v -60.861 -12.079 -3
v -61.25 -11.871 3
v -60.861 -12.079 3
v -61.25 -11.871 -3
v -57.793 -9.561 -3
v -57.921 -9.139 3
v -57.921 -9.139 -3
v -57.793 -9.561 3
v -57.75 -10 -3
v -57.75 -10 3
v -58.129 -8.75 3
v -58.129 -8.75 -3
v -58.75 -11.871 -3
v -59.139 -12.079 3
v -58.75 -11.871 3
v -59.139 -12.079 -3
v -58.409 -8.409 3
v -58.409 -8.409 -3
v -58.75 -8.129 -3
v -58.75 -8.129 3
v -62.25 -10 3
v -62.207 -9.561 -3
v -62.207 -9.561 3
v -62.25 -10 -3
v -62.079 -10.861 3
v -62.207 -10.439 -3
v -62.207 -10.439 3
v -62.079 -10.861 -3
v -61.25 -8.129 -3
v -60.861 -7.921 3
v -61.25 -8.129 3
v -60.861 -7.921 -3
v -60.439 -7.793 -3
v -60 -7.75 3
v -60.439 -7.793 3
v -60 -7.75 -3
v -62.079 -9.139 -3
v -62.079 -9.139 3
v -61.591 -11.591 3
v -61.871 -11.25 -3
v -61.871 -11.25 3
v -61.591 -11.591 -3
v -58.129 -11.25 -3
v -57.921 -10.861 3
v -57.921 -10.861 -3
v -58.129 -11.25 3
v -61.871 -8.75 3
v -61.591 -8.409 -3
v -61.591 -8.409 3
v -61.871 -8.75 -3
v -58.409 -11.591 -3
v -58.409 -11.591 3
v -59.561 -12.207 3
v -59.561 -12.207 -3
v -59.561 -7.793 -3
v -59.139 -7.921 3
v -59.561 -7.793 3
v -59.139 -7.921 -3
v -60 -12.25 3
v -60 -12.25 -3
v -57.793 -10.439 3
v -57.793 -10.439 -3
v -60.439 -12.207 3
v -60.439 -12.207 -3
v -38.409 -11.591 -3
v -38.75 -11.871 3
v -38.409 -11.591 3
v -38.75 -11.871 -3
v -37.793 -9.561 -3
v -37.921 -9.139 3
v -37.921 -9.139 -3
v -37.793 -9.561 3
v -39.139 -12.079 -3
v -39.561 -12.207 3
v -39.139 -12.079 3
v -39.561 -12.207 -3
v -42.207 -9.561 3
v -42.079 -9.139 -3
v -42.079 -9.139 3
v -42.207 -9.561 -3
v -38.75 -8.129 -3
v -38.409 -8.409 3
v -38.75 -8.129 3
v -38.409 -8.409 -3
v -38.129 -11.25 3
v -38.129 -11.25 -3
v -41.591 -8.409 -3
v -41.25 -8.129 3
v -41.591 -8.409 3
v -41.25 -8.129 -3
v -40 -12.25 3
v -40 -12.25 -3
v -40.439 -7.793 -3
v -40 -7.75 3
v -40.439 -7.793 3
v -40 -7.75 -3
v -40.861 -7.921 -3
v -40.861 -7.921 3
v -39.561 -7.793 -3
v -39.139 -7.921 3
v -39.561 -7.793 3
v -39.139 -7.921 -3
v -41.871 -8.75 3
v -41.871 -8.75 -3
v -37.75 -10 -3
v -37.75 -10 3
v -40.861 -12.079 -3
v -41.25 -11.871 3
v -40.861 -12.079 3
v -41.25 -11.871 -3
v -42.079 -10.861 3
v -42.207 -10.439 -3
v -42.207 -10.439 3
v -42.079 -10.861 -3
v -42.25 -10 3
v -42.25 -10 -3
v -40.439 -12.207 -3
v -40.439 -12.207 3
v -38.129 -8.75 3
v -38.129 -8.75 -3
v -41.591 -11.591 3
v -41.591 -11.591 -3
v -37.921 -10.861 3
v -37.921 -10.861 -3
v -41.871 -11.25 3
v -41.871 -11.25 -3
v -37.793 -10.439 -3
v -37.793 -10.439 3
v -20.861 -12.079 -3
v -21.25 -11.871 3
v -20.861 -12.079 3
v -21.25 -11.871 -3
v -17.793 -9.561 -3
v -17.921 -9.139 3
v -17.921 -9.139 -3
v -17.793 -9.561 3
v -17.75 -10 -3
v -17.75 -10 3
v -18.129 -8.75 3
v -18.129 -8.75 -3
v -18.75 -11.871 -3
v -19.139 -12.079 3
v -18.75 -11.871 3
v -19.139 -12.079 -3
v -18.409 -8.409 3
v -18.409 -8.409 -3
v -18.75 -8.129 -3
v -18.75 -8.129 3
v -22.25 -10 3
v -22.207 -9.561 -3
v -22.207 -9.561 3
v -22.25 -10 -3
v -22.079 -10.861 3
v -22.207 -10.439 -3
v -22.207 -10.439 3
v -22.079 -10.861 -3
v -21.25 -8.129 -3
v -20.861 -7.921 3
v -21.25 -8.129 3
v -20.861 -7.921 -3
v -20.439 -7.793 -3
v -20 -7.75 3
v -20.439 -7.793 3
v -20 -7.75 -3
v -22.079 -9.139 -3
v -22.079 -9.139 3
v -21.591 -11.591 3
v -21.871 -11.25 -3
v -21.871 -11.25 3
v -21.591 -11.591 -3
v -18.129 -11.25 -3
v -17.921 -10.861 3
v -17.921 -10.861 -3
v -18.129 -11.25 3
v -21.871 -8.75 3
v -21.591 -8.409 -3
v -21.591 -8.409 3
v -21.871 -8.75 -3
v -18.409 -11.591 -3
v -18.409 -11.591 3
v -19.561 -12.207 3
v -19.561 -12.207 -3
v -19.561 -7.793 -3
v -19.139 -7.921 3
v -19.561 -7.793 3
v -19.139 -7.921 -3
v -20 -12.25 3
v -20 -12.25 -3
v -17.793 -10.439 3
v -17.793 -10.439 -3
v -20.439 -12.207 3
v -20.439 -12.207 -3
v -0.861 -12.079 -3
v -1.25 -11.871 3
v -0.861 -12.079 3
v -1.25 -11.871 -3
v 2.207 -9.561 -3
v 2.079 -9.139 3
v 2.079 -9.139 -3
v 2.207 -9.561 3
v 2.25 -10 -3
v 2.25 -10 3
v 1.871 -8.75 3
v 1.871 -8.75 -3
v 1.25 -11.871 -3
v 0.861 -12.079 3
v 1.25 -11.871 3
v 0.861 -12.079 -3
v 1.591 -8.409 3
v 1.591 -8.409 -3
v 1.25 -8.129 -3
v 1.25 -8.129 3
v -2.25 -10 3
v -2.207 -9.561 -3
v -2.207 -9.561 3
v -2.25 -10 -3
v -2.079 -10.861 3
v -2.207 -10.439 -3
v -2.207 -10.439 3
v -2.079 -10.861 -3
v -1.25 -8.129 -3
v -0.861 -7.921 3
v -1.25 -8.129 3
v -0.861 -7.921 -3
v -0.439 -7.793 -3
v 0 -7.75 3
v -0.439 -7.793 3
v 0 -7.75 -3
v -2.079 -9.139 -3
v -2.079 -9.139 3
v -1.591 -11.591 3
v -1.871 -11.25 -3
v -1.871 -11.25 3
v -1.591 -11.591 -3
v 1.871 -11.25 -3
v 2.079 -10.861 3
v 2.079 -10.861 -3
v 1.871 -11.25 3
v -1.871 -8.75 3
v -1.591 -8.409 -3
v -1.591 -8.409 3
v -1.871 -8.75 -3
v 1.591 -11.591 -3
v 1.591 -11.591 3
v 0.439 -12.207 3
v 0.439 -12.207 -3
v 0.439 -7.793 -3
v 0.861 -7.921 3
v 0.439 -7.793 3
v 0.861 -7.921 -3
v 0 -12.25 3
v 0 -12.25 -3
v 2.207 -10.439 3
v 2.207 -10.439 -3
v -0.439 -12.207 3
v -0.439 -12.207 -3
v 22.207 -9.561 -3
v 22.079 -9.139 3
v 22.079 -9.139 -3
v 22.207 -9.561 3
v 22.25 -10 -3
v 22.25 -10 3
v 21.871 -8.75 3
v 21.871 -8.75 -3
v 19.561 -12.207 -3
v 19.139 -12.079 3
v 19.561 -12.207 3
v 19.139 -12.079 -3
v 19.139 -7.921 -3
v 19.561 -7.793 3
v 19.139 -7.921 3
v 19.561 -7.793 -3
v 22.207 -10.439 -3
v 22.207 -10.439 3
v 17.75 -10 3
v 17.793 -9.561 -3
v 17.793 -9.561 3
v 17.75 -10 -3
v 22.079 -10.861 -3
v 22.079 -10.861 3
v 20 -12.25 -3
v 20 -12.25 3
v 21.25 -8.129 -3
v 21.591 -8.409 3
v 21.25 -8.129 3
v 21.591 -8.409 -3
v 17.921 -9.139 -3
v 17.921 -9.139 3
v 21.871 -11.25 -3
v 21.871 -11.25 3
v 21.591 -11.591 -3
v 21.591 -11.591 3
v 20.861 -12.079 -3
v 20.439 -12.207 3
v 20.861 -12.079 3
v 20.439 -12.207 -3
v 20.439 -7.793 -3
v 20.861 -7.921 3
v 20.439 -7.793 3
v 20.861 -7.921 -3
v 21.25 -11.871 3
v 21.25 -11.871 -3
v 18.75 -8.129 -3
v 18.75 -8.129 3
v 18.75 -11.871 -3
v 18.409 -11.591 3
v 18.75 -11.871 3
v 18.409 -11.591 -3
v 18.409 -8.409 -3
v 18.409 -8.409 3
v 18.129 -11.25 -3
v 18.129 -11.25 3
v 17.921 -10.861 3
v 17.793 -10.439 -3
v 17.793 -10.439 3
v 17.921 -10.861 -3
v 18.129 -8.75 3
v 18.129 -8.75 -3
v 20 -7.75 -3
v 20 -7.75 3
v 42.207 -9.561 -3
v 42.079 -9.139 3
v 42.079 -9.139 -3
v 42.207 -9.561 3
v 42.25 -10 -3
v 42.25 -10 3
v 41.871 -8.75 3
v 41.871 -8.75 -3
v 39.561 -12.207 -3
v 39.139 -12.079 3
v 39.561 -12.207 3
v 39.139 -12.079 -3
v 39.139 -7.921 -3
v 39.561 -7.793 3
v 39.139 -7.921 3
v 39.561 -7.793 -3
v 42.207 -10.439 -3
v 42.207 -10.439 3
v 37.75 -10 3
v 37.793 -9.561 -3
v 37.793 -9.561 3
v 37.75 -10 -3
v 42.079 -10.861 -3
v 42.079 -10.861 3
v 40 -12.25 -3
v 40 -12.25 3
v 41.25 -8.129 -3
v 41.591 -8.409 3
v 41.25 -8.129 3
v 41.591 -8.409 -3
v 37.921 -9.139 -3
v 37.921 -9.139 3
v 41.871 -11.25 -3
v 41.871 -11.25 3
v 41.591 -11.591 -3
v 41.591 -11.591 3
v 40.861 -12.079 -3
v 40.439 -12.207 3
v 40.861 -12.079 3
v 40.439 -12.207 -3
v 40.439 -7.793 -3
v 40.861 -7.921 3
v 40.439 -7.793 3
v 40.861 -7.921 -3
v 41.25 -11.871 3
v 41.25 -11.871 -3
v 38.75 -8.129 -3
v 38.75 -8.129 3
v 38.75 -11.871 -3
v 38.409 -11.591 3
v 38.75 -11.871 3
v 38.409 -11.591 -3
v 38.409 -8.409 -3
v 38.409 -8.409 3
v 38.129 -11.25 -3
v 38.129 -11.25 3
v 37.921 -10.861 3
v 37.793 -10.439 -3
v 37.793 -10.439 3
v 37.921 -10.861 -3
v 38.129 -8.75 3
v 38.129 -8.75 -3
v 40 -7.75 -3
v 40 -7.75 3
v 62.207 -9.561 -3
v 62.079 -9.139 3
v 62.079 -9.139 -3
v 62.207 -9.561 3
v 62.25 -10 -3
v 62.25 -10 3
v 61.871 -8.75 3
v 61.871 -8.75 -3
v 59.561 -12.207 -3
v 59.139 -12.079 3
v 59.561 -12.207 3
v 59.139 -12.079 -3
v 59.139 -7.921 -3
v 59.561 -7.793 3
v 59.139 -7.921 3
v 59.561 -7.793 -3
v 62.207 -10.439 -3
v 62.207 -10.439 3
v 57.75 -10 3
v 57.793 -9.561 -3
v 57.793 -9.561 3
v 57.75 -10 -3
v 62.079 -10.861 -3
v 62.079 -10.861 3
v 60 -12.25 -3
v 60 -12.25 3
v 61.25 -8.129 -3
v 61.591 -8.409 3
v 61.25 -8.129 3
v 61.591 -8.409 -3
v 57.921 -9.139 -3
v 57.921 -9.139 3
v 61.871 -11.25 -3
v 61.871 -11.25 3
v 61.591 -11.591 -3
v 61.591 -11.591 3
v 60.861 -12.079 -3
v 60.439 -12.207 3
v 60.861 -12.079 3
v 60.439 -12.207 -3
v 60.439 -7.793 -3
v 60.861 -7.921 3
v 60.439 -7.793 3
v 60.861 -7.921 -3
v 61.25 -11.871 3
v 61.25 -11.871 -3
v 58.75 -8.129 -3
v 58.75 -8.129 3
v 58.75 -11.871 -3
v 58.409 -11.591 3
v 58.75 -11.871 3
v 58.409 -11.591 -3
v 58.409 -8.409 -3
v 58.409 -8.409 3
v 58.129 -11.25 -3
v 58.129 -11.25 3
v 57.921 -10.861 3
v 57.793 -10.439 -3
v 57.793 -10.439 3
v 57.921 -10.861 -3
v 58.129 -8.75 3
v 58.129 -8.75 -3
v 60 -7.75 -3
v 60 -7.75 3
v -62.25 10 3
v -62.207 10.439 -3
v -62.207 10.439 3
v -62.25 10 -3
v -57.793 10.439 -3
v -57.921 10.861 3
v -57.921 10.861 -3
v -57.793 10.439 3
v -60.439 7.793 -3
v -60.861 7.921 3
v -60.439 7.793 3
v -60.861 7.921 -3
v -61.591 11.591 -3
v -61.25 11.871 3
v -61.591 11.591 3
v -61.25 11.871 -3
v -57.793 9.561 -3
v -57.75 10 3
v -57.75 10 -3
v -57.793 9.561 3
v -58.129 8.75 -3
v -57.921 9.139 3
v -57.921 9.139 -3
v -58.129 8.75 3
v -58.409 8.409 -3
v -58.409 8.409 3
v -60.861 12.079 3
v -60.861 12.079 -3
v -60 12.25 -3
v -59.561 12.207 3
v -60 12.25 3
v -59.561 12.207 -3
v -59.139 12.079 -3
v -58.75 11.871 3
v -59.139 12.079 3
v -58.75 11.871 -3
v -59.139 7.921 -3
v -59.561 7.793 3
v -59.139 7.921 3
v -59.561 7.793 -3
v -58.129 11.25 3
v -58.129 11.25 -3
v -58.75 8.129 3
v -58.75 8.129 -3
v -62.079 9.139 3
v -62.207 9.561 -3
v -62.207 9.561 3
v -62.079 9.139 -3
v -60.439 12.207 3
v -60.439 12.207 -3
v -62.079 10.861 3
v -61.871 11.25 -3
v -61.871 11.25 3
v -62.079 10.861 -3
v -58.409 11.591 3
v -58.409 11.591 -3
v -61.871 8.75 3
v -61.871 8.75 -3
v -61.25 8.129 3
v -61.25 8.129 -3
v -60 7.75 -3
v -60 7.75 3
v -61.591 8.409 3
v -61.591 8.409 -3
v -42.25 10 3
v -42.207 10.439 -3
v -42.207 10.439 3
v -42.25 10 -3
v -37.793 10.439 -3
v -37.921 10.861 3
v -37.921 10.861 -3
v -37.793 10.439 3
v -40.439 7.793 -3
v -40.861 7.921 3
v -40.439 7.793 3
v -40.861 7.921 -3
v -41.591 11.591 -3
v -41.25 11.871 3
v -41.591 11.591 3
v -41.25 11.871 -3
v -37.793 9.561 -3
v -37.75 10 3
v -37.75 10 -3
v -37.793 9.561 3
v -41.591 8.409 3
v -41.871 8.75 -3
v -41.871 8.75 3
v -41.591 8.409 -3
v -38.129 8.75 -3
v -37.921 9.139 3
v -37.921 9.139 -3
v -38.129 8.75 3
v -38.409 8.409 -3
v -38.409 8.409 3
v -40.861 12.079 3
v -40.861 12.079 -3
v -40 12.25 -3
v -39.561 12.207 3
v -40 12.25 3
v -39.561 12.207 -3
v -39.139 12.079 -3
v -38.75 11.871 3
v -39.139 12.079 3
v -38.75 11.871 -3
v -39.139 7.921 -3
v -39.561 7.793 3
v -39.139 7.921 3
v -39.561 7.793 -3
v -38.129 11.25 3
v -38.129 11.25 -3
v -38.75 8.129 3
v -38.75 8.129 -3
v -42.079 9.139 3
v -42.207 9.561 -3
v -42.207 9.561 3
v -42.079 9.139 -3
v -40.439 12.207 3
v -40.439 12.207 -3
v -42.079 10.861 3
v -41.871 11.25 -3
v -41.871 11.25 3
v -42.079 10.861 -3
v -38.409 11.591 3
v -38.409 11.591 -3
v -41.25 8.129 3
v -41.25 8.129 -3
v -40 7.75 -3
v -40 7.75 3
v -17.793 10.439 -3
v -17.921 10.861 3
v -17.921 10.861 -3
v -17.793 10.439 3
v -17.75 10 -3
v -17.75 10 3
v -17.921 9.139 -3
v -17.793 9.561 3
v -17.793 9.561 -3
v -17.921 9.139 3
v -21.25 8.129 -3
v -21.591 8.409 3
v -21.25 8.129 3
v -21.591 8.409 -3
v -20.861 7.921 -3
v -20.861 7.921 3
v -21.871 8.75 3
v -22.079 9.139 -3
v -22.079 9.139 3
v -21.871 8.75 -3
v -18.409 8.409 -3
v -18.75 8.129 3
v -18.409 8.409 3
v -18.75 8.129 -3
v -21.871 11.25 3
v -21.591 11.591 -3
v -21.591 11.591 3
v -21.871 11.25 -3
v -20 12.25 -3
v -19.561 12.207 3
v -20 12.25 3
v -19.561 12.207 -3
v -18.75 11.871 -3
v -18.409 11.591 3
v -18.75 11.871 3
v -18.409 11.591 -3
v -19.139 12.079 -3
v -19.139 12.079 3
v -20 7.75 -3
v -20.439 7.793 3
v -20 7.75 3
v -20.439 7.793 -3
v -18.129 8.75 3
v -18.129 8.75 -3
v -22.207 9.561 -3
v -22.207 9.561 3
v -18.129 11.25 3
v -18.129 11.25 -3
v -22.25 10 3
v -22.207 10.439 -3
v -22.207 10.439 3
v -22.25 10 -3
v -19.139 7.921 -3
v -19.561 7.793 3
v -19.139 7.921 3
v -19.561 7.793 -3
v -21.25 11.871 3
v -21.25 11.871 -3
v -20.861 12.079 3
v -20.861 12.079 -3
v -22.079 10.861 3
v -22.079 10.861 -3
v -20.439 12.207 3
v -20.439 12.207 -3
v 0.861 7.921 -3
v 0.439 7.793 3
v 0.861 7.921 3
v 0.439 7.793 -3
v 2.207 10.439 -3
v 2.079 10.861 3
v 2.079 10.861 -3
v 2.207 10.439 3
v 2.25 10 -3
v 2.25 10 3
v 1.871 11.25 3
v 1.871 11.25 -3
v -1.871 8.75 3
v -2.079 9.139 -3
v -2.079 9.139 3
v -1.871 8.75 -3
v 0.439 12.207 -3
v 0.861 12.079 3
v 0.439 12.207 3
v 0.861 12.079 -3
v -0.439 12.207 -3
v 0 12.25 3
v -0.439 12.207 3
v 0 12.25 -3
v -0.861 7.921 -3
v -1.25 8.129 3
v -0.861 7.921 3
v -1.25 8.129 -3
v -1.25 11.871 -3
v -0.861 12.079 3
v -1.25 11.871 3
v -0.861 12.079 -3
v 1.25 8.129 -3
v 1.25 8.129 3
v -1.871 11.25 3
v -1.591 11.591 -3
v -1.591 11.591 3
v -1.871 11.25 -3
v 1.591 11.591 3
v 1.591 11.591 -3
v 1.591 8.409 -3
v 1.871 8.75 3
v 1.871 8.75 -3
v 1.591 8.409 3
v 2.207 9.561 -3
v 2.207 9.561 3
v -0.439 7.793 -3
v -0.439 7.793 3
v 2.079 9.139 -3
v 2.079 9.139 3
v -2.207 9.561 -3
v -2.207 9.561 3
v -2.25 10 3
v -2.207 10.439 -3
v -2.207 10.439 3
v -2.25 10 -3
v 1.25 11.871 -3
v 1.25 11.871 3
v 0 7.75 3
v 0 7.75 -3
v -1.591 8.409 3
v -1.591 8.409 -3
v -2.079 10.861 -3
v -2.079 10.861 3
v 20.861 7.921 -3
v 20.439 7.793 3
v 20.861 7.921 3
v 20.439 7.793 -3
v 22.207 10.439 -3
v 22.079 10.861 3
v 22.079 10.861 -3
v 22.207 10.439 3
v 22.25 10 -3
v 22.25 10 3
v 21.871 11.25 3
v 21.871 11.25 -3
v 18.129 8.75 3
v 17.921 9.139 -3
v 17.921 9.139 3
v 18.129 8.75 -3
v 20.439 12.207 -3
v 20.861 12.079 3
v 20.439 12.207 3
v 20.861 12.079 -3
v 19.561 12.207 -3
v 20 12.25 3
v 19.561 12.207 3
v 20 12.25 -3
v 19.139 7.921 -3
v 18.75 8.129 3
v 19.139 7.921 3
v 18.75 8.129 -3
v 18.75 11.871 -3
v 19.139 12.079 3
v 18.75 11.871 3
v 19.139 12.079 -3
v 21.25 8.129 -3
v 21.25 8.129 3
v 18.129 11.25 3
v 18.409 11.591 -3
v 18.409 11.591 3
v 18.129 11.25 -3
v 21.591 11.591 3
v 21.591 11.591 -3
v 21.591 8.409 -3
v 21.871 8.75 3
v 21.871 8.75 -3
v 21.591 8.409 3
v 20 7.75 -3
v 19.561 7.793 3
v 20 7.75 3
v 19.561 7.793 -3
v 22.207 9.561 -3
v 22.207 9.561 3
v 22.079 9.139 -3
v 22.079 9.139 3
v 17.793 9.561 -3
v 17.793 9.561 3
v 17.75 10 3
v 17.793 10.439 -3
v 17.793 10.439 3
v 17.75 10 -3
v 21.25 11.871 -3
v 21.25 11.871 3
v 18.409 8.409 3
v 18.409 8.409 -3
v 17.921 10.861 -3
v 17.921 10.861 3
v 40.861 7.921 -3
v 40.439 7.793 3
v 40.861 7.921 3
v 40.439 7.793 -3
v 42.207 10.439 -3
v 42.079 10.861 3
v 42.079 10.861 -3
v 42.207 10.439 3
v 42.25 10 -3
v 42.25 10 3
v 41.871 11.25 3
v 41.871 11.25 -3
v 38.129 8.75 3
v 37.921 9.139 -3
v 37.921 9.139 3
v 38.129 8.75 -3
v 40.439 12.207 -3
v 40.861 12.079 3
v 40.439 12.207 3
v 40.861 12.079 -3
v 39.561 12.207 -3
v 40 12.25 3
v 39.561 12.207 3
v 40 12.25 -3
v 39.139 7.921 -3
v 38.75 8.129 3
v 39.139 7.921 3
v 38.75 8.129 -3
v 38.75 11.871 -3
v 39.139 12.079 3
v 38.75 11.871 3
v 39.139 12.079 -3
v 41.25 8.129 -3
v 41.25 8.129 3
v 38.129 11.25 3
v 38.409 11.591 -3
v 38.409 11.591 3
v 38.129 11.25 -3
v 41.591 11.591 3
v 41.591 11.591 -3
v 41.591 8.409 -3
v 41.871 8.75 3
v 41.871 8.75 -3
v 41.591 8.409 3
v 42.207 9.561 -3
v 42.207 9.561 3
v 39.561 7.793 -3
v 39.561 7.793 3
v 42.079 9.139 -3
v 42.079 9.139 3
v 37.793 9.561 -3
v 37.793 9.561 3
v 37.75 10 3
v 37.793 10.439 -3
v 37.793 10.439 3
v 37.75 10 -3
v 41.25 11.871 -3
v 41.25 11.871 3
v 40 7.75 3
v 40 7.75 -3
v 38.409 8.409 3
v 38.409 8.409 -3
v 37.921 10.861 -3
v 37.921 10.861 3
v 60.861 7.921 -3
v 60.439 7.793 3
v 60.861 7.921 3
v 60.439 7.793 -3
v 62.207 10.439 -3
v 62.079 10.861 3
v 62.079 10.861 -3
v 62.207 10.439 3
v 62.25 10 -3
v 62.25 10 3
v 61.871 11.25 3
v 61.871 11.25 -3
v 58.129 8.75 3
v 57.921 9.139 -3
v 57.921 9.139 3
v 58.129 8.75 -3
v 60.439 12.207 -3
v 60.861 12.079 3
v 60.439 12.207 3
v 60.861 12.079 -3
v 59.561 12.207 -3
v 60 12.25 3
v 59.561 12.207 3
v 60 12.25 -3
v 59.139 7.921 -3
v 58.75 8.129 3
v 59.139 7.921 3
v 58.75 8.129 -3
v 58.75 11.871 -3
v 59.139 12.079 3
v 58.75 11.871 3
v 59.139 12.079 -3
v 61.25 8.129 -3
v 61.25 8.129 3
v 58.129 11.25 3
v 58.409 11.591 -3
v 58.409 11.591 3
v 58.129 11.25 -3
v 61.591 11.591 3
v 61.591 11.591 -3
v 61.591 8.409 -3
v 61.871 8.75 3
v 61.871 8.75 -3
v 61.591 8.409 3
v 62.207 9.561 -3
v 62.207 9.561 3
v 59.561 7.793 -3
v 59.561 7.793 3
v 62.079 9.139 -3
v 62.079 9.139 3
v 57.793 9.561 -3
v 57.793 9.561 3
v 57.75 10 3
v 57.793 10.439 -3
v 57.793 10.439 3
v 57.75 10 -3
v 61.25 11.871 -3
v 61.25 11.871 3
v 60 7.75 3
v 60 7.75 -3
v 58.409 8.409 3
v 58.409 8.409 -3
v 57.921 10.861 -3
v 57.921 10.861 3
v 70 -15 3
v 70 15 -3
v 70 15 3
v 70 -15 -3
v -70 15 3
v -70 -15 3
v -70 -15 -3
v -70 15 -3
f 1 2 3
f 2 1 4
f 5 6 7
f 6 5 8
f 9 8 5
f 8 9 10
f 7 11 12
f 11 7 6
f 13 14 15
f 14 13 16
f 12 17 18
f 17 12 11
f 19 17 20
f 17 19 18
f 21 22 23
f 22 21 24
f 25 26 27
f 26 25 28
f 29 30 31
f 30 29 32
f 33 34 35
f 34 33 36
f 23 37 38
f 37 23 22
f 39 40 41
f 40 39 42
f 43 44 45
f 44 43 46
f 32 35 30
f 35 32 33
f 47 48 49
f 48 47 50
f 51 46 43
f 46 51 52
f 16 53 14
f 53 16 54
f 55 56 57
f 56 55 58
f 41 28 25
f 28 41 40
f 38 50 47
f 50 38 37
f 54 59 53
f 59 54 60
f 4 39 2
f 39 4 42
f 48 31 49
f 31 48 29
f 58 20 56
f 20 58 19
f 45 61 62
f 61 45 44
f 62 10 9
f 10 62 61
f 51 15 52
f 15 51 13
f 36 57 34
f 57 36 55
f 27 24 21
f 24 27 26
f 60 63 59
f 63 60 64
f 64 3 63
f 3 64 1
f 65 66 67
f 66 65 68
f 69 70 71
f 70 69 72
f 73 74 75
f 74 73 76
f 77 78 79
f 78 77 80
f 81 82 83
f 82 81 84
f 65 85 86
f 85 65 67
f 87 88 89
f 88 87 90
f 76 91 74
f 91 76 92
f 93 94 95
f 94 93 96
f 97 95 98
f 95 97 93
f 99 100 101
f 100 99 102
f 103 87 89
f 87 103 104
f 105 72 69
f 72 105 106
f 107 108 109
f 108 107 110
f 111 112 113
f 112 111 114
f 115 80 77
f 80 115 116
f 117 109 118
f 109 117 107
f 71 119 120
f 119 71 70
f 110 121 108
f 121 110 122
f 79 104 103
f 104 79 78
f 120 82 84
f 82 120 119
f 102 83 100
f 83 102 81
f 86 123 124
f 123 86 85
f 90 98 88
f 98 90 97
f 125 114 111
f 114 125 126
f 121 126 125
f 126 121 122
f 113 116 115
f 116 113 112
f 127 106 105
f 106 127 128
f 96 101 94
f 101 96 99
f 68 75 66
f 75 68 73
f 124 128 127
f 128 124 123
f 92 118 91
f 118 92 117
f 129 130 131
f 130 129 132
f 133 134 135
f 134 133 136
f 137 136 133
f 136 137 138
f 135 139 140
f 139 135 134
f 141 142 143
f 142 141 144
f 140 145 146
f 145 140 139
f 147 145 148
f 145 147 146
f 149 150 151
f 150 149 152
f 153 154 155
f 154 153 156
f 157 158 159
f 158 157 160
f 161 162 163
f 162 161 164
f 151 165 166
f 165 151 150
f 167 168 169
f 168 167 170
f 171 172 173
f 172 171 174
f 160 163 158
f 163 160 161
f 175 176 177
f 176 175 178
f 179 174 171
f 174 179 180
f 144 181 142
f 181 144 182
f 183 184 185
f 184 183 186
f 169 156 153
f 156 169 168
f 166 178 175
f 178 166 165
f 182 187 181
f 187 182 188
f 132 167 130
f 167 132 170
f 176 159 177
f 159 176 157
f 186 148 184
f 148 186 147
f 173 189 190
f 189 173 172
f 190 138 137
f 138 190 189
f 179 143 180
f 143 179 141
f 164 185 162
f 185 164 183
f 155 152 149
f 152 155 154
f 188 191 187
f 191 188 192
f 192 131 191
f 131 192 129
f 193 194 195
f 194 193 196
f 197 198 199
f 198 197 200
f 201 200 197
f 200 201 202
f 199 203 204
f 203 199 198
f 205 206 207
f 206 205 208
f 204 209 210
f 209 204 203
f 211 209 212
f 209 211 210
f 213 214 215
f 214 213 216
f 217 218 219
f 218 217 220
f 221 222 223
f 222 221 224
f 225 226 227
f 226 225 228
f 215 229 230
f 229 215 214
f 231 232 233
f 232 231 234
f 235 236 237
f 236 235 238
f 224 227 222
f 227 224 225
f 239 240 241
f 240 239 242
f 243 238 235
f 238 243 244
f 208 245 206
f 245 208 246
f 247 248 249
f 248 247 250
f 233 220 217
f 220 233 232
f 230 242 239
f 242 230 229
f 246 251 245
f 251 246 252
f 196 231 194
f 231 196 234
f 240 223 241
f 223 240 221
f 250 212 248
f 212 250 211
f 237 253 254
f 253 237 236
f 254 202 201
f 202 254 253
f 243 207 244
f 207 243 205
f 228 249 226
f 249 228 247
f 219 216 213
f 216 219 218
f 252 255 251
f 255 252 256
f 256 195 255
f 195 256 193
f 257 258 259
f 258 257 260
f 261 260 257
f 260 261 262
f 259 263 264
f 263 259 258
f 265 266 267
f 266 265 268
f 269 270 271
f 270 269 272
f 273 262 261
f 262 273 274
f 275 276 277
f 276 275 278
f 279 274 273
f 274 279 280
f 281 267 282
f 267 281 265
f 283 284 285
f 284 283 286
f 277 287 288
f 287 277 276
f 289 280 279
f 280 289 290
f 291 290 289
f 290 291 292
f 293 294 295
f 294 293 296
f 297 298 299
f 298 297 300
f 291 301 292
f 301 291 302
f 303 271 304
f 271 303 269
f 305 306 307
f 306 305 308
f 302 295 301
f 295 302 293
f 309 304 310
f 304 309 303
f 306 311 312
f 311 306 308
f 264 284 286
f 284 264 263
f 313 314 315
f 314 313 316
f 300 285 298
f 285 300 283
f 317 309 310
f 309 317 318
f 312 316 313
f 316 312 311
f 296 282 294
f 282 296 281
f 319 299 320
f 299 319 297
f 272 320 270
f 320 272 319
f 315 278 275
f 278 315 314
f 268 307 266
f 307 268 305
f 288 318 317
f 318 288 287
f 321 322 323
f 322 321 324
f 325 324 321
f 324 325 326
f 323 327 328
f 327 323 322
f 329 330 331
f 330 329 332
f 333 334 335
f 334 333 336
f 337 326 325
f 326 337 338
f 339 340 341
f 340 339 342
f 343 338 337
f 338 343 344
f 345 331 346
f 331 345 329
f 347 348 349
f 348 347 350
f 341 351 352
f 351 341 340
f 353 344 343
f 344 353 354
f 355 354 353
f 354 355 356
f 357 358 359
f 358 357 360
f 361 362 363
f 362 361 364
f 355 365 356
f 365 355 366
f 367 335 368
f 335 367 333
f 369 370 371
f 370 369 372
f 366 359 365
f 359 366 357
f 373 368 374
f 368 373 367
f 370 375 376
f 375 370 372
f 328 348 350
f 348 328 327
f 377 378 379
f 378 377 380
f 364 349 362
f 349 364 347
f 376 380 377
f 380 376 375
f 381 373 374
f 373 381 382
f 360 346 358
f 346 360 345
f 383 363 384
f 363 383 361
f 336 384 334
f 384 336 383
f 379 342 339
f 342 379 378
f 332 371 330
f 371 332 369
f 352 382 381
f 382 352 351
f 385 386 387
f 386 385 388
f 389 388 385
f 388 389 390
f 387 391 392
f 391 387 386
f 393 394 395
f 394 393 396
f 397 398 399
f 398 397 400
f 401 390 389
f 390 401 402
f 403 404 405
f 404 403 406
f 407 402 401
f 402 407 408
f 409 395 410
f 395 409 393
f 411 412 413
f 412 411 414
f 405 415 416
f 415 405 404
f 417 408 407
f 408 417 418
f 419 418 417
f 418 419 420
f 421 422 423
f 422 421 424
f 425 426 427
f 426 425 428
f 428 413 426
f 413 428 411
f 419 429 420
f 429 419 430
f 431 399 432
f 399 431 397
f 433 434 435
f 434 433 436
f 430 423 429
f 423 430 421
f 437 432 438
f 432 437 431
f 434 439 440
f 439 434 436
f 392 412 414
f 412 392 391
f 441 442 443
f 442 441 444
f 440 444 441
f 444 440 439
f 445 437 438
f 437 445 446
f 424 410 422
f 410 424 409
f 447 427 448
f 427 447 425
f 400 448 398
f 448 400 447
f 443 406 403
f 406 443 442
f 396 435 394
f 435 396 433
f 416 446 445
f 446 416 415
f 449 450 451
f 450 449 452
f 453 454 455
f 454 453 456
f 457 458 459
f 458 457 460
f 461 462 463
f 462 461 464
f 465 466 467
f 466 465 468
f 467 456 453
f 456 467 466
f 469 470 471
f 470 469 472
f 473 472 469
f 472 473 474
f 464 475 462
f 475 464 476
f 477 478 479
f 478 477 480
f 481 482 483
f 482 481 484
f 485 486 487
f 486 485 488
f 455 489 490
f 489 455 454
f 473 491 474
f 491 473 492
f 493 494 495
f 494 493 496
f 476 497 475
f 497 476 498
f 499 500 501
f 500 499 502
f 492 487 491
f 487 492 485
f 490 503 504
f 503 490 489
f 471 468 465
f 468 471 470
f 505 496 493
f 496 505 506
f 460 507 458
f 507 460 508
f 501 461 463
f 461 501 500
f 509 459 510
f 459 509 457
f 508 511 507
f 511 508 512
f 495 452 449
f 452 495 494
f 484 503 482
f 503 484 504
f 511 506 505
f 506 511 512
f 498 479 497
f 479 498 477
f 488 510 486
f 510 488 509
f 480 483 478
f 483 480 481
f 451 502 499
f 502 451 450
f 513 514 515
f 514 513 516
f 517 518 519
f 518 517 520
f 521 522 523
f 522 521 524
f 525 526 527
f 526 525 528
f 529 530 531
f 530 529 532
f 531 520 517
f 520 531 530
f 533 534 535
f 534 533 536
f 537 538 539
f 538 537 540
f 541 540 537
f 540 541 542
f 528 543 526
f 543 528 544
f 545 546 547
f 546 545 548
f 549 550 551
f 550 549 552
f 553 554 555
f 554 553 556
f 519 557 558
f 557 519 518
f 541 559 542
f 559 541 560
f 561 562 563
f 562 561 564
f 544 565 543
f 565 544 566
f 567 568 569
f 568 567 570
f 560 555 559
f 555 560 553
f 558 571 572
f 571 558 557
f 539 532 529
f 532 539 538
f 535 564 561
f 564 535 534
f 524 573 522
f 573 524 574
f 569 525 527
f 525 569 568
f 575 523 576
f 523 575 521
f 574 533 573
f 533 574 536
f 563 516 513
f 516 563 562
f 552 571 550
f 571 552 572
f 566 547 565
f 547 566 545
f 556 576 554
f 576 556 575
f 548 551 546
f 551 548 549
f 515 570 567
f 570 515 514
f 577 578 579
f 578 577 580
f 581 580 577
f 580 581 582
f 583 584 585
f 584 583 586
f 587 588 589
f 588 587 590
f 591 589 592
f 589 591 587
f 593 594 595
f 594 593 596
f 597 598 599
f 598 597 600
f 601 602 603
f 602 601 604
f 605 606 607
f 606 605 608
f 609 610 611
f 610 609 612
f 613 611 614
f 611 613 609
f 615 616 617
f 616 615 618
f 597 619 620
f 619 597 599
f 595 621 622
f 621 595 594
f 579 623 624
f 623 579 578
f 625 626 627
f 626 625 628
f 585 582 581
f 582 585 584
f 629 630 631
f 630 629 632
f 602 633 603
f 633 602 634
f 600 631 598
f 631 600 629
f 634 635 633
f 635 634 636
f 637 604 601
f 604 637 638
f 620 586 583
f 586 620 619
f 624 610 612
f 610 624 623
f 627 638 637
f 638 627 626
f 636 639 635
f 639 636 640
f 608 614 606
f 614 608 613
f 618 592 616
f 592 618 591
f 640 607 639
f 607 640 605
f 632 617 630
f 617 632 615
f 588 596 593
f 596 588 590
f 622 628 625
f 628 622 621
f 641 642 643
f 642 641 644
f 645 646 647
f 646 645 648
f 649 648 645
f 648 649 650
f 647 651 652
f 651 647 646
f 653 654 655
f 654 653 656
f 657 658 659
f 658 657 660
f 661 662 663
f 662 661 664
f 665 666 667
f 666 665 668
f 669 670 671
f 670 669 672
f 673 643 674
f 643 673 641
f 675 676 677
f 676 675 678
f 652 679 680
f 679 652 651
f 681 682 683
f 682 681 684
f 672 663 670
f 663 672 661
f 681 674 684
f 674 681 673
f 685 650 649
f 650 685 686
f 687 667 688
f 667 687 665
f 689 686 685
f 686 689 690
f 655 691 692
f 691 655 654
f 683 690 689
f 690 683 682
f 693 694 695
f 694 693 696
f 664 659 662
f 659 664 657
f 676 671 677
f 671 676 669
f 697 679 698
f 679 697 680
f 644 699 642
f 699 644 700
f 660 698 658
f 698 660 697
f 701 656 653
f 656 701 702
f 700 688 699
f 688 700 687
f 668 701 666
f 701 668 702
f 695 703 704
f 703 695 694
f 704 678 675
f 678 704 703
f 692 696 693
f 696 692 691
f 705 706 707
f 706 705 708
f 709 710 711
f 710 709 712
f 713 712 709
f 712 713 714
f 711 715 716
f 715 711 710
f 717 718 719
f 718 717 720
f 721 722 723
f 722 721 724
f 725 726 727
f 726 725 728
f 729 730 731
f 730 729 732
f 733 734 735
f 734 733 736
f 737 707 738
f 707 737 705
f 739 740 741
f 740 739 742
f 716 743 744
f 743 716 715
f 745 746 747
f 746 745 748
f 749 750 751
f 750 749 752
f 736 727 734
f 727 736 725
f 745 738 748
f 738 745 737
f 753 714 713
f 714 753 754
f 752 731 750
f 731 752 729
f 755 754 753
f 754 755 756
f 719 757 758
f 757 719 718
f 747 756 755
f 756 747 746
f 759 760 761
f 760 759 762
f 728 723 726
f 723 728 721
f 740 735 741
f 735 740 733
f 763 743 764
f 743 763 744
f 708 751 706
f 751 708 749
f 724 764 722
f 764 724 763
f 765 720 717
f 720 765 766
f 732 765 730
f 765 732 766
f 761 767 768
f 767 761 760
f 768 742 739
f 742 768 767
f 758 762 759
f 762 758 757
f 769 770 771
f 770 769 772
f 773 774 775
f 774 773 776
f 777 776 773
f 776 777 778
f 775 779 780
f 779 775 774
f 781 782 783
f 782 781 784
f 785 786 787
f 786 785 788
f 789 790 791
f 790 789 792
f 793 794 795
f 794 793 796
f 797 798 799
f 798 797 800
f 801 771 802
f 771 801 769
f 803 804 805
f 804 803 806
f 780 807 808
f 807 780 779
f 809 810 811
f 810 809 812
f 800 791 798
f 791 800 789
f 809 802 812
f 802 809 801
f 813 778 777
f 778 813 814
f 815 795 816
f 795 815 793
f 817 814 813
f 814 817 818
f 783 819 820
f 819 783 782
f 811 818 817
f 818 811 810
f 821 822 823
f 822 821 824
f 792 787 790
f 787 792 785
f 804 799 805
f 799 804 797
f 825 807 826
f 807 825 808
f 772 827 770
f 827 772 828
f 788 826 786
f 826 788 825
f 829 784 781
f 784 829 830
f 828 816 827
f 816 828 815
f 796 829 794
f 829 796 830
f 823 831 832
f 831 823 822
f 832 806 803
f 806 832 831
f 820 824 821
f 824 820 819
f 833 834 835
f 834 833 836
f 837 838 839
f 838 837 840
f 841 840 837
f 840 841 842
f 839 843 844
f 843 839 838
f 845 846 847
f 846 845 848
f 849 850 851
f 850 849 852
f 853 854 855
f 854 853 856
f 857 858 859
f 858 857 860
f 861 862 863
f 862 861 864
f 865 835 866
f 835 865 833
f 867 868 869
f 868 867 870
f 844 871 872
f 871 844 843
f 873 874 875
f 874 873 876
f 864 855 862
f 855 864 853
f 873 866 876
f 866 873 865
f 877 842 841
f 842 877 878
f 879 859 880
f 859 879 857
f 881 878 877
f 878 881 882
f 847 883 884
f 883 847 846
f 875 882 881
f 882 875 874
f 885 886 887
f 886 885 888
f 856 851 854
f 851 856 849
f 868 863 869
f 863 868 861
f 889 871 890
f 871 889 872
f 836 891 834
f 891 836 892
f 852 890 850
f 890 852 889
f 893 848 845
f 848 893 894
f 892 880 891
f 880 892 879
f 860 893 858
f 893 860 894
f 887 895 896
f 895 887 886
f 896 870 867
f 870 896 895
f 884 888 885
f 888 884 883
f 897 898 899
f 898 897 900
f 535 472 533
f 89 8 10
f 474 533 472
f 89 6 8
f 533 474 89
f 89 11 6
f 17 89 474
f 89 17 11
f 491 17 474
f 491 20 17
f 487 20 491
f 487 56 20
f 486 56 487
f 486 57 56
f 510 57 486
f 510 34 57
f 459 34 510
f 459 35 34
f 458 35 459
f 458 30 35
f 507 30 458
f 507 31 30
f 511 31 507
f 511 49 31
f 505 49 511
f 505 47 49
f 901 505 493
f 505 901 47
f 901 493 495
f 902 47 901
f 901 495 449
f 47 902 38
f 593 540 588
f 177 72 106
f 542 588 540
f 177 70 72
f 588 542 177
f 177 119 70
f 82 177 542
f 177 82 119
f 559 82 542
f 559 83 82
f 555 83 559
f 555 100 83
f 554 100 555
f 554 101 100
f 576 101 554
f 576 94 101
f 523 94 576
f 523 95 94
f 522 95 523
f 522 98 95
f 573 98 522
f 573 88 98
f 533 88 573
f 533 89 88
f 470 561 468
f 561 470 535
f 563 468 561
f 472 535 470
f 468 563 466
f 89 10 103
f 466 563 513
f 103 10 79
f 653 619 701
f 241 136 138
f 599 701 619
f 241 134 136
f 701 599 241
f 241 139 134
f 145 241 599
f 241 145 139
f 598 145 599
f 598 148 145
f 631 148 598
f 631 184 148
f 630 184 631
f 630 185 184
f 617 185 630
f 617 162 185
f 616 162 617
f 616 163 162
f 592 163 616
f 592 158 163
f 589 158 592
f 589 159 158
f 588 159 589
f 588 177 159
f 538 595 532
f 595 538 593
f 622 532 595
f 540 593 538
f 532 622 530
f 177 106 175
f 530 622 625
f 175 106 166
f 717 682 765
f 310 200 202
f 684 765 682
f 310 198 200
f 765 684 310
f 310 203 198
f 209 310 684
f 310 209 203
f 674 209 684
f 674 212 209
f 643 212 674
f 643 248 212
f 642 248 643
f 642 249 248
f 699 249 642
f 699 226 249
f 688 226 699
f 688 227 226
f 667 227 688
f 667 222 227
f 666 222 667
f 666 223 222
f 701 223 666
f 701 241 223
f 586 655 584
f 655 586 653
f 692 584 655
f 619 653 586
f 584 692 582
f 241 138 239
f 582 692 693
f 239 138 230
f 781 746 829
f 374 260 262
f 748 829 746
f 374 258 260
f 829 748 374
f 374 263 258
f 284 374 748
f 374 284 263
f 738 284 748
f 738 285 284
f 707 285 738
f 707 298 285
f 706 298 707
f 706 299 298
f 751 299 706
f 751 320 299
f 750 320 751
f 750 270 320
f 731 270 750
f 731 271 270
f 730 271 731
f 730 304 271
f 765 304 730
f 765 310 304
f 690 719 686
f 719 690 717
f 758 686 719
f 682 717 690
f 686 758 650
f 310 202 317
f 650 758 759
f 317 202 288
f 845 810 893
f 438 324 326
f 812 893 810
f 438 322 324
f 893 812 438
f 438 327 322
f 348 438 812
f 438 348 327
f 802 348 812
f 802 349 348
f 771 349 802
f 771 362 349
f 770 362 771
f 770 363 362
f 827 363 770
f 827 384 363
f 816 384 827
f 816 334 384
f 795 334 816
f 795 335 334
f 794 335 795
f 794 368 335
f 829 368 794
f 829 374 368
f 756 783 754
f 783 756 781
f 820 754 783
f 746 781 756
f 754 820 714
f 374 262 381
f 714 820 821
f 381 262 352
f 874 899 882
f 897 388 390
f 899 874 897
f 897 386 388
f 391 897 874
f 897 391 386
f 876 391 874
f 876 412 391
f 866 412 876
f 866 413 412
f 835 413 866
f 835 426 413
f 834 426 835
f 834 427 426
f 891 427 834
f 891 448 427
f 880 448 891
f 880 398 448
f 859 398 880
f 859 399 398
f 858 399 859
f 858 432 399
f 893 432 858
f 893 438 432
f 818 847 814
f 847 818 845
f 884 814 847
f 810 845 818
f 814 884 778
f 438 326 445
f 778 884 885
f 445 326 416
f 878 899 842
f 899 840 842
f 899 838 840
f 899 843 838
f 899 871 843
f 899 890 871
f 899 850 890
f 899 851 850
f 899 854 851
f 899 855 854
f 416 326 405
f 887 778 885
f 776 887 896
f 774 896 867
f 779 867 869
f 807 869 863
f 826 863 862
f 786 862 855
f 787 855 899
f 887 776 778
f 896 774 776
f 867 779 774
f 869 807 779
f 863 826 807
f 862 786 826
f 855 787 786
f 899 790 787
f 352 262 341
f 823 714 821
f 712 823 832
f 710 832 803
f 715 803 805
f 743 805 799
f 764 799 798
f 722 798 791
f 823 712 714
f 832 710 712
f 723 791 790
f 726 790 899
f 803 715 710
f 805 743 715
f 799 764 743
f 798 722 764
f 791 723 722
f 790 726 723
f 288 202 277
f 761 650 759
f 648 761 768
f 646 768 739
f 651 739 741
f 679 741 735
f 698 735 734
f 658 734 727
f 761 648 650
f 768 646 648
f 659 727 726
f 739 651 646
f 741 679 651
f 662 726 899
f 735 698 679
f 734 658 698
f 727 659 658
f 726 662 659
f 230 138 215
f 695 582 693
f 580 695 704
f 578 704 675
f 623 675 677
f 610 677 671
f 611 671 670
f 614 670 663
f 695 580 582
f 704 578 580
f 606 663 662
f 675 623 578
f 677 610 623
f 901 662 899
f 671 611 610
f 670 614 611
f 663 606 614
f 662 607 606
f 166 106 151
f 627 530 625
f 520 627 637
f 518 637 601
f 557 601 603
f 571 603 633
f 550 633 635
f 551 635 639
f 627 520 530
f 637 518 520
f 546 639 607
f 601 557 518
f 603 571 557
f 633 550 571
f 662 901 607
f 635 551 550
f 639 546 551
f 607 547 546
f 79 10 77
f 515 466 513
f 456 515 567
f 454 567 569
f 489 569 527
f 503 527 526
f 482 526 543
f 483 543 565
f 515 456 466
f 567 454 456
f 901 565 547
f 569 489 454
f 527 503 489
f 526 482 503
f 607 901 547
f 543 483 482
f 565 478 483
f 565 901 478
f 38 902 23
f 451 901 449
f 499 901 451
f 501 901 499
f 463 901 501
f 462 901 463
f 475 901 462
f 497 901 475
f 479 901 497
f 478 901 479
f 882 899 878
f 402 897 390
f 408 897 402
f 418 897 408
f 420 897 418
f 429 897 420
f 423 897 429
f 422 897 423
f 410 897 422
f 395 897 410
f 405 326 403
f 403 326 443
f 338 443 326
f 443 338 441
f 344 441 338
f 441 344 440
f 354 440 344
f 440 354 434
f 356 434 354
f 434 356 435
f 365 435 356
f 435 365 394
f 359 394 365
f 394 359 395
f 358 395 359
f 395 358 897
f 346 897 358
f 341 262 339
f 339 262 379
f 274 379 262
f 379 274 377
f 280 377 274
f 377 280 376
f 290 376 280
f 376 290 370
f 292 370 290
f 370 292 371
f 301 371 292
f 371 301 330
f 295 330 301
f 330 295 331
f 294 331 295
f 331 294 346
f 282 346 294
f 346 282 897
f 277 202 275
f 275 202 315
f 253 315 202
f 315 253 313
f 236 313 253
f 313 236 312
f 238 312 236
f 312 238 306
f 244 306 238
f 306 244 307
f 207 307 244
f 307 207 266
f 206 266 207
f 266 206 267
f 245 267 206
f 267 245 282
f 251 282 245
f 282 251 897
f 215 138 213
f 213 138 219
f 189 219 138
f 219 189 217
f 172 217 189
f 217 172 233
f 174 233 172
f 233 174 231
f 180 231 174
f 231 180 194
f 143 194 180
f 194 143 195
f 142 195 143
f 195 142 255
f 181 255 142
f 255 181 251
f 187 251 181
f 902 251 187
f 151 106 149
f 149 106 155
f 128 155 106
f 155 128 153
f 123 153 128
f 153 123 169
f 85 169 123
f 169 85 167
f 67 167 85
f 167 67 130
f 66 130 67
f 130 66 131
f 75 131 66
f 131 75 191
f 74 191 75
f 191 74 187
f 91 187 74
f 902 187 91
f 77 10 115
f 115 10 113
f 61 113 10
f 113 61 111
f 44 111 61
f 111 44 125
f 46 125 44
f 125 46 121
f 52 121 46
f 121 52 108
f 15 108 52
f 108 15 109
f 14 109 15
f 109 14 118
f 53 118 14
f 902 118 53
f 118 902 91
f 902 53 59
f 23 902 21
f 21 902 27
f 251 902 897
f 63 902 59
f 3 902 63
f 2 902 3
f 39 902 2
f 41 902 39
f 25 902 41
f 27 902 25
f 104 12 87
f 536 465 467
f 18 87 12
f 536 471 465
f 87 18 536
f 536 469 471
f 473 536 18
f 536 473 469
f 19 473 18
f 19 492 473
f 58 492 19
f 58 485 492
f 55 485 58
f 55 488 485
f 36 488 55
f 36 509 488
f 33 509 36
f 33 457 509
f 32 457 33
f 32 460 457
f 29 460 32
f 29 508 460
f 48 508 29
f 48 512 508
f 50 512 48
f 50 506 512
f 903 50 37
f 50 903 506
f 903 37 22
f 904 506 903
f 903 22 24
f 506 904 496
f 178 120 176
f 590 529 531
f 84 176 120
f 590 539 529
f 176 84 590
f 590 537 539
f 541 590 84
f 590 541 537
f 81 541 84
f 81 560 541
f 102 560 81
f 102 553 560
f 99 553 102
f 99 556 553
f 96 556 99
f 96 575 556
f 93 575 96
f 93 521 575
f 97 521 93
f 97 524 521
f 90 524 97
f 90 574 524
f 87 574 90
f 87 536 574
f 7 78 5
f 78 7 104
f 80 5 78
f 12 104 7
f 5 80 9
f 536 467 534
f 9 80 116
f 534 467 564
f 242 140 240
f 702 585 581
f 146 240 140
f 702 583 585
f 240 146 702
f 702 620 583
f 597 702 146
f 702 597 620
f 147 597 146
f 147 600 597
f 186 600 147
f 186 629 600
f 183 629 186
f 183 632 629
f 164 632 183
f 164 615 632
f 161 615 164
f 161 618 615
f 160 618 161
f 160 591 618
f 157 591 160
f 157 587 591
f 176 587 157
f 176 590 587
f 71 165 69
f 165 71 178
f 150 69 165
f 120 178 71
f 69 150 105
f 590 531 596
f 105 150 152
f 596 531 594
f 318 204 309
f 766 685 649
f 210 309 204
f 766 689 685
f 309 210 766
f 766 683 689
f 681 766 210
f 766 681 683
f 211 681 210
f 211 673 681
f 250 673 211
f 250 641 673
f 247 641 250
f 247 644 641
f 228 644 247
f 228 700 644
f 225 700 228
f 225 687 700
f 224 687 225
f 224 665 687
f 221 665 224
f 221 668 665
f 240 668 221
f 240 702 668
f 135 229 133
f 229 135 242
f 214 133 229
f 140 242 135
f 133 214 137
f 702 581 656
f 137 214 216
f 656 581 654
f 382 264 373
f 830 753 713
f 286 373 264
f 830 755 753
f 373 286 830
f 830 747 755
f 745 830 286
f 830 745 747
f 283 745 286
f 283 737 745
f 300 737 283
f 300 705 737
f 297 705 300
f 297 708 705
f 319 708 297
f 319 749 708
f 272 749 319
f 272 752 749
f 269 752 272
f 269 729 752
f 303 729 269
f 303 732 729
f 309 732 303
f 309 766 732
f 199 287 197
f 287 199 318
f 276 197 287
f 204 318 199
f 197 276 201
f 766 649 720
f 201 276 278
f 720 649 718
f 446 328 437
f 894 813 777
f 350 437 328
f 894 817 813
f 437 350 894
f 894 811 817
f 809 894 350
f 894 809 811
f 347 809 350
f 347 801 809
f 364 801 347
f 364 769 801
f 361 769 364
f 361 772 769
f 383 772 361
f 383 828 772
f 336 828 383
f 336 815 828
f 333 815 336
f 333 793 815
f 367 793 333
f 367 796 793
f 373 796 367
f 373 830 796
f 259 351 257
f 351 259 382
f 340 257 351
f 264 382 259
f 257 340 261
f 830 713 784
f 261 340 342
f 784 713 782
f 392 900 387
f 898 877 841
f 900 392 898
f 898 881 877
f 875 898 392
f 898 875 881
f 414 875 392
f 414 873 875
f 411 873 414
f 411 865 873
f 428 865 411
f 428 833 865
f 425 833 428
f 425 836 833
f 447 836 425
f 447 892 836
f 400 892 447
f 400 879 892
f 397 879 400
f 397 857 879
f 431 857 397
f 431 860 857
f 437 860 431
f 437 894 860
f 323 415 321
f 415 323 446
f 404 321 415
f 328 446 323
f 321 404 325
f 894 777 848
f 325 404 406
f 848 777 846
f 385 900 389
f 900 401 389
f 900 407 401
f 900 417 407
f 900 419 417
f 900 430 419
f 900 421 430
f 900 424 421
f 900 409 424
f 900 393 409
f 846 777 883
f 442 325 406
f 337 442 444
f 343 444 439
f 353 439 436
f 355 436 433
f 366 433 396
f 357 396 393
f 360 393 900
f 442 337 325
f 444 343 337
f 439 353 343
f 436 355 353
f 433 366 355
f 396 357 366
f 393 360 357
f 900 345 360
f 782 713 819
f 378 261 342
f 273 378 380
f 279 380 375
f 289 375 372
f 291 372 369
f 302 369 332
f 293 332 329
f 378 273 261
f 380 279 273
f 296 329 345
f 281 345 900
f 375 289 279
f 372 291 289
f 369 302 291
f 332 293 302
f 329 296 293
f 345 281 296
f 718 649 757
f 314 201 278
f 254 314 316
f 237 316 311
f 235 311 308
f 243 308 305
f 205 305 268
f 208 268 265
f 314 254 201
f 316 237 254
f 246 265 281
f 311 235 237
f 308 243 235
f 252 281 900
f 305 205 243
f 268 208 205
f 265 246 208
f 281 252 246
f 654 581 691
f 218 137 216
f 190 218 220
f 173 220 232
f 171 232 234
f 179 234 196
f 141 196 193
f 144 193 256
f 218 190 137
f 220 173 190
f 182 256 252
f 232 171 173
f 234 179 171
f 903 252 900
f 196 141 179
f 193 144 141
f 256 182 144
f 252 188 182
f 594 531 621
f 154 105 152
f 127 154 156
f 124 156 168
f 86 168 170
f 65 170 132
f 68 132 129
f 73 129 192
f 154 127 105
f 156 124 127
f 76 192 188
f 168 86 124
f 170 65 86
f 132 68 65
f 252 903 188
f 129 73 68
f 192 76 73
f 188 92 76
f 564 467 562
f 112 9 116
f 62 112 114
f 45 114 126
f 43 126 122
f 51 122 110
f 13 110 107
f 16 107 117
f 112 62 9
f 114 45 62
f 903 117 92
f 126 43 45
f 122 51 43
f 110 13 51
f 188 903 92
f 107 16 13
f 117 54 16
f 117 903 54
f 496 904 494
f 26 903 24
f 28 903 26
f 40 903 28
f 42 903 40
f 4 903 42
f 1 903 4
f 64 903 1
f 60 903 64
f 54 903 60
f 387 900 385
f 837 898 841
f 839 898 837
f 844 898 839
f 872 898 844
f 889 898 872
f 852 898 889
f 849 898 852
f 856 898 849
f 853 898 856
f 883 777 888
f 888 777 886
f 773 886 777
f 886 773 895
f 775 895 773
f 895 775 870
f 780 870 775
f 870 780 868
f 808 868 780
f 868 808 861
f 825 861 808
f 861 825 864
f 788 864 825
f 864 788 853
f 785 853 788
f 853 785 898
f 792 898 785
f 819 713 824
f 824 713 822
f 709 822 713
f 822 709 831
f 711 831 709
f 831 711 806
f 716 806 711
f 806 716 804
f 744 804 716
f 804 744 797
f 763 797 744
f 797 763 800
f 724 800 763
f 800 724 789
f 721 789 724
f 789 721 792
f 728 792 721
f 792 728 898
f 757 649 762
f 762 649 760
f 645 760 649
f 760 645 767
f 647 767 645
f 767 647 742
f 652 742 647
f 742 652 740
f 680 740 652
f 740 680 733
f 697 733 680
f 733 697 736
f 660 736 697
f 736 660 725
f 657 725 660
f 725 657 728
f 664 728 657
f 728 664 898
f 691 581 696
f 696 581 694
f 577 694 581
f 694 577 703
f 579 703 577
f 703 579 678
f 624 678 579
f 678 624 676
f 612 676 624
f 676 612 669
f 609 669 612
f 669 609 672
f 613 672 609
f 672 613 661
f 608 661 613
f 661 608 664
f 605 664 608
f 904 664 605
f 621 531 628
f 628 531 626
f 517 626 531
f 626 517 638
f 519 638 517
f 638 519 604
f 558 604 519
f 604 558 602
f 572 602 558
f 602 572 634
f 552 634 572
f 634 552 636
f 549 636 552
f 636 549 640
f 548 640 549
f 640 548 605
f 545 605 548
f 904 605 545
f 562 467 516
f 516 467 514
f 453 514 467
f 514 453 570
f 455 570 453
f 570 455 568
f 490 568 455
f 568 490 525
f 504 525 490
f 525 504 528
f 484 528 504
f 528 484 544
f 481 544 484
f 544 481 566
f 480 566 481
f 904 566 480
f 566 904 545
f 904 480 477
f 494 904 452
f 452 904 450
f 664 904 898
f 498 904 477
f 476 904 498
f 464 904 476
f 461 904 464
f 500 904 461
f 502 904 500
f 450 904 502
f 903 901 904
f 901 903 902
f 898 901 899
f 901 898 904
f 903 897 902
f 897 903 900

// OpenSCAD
$fn = 32;

// ----------------------------------------------------------------------
// Hole bar, 7 x Ø4.5
// tworows layout, 10 mm edge offset
// ----------------------------------------------------------------------

// --- parameters (mm) ---
bar_w = 30;       // bar width (Y)
bar_t = 6;        // bar thickness (Z)
holes = 7;        // holes per row
hole_d = 4.5;     // hole diameter
edge = 10;        // offset from the bar end to the first hole
pitch = 20;       // pitch between neighbouring holes
row_offset = 20;  // distance between the two rows

// --- derived feature positions (mm) ---
span = (holes - 1) * pitch;   // = 120   distance between the end holes
bar_l = span + 2 * edge;      // = 140   overall bar length
start_x = -bar_l / 2 + edge;  // = -60   X of the first hole
feature_centers = [
  [start_x + 0 * pitch, -row_offset / 2],
  [start_x + 1 * pitch, -row_offset / 2],
  [start_x + 2 * pitch, -row_offset / 2],
  [start_x + 3 * pitch, -row_offset / 2],
  [start_x + 4 * pitch, -row_offset / 2],
  [start_x + 5 * pitch, -row_offset / 2],
  [start_x + 6 * pitch, -row_offset / 2]
];   // hole centres of the first row
row2_centers = [
  [start_x + 0 * pitch, row_offset / 2],
  [start_x + 1 * pitch, row_offset / 2],
  [start_x + 2 * pitch, row_offset / 2],
  [start_x + 3 * pitch, row_offset / 2],
  [start_x + 4 * pitch, row_offset / 2],
  [start_x + 5 * pitch, row_offset / 2],
  [start_x + 6 * pitch, row_offset / 2]
];   // hole centres of the second row

// bar with two rows of holes, both read from their own centre arrays
difference() {
  translate([-bar_l / 2, -bar_w / 2, -bar_t / 2]) cube([bar_l, bar_w, bar_t]);
  for (centre = feature_centers)
    translate([centre[0], centre[1], 0])
      cylinder(d = hole_d, h = bar_t + 2, center = true);
  for (centre = row2_centers)
    translate([centre[0], centre[1], 0])
      cylinder(d = hole_d, h = bar_t + 2, center = true);
}
